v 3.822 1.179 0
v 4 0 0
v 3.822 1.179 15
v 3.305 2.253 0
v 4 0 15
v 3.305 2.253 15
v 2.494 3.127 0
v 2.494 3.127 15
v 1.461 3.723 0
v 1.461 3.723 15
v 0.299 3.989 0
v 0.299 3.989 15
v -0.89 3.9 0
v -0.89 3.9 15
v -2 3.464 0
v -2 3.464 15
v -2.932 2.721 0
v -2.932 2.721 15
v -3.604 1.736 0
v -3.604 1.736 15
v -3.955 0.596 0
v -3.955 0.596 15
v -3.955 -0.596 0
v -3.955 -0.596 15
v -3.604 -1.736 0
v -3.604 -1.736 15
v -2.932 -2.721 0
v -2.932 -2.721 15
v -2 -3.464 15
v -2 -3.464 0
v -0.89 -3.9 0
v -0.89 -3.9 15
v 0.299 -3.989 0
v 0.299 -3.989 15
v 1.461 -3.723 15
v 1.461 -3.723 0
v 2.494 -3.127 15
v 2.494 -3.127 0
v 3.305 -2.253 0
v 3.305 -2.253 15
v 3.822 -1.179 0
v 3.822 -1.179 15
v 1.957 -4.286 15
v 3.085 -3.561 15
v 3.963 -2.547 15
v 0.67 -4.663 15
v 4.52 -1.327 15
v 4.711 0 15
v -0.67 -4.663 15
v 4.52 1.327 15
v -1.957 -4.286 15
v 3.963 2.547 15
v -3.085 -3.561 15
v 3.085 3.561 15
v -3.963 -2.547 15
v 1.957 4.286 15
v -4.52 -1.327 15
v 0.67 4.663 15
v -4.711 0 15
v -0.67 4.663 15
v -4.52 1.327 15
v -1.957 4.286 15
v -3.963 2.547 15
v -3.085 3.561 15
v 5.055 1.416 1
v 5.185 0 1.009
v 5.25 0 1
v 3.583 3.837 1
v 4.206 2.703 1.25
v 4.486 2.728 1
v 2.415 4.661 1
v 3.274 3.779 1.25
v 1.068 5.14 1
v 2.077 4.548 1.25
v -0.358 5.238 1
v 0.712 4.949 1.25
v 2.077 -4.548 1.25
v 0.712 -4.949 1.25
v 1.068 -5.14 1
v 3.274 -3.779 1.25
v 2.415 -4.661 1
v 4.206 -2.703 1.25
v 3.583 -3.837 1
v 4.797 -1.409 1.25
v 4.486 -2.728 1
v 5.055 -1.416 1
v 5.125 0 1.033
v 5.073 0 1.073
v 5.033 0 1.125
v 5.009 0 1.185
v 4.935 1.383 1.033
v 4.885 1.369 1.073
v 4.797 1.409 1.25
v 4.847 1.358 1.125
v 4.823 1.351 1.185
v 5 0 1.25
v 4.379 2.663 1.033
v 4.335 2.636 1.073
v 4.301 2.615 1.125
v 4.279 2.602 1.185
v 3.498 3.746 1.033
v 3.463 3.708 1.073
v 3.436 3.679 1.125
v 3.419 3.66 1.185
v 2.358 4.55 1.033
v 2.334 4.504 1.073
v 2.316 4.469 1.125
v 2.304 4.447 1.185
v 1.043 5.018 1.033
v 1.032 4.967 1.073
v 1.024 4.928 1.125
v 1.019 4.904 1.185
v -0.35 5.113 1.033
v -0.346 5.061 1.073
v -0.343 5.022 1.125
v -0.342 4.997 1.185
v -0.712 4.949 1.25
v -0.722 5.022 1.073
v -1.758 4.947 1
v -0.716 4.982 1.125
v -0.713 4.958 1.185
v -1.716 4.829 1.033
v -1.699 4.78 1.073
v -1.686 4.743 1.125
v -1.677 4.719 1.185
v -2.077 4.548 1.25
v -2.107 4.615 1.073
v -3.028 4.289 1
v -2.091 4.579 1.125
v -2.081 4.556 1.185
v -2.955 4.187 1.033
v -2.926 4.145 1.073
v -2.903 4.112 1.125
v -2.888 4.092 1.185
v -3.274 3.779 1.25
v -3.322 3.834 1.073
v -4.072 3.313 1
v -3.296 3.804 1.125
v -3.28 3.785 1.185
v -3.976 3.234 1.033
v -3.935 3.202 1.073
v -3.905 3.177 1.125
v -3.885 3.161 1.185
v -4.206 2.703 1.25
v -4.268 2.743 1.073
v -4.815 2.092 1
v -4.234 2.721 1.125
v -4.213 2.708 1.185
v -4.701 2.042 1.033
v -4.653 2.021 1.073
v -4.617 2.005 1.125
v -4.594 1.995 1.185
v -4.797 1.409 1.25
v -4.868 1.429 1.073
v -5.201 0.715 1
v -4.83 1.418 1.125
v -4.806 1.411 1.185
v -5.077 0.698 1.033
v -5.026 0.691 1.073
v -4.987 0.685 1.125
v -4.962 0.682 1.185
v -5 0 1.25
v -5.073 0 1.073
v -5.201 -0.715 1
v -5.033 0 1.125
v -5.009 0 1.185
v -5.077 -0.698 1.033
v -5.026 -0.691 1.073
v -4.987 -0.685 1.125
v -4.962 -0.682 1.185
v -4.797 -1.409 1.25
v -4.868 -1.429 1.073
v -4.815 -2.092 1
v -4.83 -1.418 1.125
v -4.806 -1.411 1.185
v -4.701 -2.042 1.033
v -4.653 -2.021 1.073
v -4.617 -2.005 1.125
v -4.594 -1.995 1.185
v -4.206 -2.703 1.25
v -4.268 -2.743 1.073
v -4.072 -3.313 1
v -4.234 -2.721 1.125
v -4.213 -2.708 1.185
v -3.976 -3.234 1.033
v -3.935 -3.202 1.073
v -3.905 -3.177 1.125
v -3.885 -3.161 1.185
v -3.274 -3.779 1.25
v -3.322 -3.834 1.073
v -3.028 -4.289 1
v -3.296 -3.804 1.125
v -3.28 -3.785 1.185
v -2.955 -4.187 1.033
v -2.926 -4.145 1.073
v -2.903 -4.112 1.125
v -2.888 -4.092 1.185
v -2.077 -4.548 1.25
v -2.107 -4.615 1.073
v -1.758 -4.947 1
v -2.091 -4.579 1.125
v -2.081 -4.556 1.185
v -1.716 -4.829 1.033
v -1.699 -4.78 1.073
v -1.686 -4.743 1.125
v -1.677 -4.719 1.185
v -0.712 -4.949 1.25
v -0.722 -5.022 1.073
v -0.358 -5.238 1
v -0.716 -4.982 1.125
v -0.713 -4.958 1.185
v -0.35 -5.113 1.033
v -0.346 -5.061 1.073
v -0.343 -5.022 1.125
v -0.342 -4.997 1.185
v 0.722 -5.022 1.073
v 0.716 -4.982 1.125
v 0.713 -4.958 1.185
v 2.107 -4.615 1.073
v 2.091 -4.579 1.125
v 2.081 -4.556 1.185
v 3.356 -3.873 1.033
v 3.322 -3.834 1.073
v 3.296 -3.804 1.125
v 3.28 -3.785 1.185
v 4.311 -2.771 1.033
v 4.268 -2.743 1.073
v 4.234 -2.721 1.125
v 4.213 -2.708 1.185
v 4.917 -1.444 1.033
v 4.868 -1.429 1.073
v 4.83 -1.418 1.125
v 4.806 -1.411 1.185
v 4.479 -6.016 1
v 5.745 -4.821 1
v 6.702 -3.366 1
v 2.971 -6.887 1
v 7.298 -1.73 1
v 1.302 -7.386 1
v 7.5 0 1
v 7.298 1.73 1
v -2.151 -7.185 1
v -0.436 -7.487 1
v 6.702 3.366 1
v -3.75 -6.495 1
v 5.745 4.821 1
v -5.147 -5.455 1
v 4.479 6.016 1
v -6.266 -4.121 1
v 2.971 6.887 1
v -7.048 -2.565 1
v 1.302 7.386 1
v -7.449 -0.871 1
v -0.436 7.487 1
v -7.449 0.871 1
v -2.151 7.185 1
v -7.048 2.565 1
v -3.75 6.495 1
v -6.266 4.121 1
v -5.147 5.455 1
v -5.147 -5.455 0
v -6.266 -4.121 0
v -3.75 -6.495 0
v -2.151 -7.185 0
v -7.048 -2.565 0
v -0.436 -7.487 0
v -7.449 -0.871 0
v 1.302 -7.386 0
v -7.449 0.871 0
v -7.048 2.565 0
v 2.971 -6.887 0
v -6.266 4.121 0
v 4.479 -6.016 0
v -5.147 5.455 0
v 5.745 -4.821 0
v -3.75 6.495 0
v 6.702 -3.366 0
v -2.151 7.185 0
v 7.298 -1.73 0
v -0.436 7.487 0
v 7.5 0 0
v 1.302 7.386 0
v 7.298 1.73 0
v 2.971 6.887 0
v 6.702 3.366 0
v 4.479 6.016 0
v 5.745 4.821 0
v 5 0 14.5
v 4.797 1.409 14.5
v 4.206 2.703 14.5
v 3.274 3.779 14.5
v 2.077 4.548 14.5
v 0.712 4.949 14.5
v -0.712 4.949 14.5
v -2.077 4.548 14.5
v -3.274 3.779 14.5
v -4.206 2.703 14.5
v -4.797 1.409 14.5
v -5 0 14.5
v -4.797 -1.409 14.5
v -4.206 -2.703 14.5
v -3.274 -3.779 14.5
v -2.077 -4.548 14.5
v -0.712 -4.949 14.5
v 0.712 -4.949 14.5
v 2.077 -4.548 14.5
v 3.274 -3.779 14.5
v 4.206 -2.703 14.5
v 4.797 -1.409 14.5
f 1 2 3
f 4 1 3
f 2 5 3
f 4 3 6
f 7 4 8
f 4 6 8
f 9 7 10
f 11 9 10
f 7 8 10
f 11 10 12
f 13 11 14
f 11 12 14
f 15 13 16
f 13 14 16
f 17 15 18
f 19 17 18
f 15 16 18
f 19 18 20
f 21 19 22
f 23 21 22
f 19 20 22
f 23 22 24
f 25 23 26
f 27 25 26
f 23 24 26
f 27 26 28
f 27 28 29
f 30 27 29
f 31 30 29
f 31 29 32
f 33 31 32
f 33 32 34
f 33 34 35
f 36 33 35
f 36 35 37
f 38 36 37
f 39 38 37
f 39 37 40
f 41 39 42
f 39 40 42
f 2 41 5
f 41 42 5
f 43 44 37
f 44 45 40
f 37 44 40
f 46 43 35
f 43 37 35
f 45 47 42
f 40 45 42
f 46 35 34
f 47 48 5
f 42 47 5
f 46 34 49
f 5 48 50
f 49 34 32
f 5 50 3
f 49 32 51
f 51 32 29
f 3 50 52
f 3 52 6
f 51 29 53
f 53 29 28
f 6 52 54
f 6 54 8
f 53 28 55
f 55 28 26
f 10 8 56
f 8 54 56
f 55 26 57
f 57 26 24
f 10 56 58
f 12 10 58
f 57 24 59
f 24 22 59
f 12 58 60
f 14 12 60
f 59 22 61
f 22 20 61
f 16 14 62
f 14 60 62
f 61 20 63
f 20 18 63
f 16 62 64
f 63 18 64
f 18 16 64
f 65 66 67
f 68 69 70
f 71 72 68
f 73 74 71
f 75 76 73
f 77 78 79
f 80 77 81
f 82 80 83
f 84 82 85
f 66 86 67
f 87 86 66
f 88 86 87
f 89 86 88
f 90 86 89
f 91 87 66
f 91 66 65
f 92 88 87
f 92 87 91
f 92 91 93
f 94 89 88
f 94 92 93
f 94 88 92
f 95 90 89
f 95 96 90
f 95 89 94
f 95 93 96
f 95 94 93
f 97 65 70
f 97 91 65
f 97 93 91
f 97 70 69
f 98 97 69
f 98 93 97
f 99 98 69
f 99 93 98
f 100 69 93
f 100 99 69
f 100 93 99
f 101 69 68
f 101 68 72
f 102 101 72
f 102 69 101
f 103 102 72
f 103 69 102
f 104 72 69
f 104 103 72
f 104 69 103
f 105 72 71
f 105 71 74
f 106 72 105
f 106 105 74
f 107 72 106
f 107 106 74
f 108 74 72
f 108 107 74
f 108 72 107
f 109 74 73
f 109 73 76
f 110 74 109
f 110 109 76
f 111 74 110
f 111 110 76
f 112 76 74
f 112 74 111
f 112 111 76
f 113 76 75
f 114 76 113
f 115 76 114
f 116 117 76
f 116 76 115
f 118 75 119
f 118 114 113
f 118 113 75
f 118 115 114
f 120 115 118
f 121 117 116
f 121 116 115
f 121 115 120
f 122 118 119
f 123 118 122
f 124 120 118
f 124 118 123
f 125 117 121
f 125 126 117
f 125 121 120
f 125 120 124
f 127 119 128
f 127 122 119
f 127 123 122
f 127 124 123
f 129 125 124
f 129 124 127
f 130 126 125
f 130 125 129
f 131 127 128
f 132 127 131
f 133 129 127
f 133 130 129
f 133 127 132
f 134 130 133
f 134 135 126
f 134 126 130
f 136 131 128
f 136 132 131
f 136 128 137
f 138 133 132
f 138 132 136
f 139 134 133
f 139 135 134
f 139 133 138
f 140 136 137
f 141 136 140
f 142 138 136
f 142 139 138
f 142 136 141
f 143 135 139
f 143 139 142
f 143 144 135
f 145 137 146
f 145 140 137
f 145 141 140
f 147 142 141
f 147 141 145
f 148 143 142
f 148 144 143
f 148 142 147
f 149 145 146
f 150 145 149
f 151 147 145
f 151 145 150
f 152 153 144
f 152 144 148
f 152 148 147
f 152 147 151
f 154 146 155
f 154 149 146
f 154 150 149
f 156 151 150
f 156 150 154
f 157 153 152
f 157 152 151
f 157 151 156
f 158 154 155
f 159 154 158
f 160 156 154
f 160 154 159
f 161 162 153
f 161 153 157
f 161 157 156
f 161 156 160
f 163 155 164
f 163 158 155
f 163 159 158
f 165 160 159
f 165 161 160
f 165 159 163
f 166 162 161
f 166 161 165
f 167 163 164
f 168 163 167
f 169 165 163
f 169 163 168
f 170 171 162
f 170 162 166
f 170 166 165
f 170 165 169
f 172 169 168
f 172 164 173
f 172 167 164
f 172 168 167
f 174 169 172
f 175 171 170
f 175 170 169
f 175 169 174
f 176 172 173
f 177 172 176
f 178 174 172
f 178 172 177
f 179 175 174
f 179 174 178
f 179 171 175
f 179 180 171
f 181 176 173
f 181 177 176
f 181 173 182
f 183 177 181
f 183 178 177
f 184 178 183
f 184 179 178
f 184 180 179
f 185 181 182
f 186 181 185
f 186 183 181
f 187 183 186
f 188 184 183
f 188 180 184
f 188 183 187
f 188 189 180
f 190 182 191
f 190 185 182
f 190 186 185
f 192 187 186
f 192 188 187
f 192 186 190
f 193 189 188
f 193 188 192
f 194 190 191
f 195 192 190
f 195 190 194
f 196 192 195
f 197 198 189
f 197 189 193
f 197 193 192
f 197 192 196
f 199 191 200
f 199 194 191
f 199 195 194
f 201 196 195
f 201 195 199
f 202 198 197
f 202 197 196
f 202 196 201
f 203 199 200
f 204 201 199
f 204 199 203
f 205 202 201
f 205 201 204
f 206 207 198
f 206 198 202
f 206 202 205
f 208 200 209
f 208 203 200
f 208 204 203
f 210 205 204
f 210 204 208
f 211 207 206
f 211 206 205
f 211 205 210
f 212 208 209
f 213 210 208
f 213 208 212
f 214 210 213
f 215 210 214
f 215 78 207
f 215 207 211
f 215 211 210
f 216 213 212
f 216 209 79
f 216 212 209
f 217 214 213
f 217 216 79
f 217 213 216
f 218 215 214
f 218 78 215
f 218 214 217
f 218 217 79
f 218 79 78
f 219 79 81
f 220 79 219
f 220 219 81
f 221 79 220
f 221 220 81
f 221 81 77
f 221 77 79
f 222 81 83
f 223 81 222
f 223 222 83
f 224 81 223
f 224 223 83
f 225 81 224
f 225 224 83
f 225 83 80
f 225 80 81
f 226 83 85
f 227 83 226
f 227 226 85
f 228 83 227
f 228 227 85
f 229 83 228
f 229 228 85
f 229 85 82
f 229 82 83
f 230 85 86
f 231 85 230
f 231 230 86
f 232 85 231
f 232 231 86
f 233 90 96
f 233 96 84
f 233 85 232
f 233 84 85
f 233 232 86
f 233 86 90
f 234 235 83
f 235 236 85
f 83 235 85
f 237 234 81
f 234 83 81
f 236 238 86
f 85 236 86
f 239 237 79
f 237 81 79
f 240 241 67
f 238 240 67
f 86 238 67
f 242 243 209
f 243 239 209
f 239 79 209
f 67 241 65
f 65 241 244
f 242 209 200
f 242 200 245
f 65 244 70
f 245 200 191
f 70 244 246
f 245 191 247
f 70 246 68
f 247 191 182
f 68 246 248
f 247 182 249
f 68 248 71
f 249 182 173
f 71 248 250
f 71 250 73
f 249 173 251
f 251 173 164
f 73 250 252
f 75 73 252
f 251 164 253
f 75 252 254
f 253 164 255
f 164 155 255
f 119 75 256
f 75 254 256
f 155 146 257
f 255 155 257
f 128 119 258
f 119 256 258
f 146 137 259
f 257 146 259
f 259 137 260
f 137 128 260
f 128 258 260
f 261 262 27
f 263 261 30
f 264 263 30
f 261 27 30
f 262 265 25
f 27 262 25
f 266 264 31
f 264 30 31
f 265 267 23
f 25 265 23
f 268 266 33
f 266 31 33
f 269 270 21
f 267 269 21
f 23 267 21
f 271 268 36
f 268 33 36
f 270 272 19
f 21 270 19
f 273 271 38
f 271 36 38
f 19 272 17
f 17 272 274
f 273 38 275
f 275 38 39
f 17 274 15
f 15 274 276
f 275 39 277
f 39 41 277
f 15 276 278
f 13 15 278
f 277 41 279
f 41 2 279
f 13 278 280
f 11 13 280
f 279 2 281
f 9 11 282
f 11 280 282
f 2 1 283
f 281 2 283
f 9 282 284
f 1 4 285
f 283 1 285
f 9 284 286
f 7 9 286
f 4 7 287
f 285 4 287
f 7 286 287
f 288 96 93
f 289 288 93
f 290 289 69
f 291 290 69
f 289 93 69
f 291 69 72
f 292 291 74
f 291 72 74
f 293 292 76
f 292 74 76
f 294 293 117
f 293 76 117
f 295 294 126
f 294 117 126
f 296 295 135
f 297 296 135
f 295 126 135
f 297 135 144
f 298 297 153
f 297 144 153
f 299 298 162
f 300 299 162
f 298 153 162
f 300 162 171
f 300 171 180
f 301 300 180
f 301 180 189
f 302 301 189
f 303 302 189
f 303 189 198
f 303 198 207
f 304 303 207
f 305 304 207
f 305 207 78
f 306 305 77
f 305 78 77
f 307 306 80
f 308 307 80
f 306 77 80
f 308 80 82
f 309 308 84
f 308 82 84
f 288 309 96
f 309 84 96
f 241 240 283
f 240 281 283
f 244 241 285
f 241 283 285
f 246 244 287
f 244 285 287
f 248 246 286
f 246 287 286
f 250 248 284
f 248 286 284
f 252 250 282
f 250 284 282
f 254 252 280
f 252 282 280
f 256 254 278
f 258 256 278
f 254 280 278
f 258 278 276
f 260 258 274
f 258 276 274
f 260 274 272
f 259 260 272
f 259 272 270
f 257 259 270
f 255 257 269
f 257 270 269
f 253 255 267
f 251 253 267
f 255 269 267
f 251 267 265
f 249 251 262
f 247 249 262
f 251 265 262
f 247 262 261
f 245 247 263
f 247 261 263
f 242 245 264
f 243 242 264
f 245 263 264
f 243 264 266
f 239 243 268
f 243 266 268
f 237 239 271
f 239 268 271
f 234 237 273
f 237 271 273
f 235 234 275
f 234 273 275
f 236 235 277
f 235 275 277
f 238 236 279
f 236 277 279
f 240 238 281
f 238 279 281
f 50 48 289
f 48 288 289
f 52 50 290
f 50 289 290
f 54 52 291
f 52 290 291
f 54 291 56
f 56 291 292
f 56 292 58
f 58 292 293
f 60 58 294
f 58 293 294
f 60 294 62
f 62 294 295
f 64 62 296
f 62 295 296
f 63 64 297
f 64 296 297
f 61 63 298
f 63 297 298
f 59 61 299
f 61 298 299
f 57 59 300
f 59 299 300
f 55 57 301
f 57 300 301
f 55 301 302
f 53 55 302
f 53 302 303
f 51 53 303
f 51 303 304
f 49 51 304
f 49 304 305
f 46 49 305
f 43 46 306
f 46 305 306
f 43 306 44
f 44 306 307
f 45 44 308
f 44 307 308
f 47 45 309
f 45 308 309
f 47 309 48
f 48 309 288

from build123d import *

# Parameters (mm, degrees)
FILLET1_R = 0.25


with BuildPart() as part:
    # Sketch1 → Revolve1 (revolve)
    with BuildSketch(Plane(origin=(0, 0, 0), x_dir=(-1, 0, 0), z_dir=(0, 1, 0))):
        Polygon((-5, 1), (-7.5, 1), (-7.5, 0), (-4, 0), (-4, 15), (-4.711324865, 15), (-5, 14.5), align=None)
    revolve(axis=Axis((0, 0, 0), (0, 0, 1)))

    # Fillet1
    fillet1_edges = [part.edges().sort_by_distance(p)[0] for p in [
        (-5, 0, 1),
    ]]
    fillet(fillet1_edges, radius=FILLET1_R)


solid = part.part
